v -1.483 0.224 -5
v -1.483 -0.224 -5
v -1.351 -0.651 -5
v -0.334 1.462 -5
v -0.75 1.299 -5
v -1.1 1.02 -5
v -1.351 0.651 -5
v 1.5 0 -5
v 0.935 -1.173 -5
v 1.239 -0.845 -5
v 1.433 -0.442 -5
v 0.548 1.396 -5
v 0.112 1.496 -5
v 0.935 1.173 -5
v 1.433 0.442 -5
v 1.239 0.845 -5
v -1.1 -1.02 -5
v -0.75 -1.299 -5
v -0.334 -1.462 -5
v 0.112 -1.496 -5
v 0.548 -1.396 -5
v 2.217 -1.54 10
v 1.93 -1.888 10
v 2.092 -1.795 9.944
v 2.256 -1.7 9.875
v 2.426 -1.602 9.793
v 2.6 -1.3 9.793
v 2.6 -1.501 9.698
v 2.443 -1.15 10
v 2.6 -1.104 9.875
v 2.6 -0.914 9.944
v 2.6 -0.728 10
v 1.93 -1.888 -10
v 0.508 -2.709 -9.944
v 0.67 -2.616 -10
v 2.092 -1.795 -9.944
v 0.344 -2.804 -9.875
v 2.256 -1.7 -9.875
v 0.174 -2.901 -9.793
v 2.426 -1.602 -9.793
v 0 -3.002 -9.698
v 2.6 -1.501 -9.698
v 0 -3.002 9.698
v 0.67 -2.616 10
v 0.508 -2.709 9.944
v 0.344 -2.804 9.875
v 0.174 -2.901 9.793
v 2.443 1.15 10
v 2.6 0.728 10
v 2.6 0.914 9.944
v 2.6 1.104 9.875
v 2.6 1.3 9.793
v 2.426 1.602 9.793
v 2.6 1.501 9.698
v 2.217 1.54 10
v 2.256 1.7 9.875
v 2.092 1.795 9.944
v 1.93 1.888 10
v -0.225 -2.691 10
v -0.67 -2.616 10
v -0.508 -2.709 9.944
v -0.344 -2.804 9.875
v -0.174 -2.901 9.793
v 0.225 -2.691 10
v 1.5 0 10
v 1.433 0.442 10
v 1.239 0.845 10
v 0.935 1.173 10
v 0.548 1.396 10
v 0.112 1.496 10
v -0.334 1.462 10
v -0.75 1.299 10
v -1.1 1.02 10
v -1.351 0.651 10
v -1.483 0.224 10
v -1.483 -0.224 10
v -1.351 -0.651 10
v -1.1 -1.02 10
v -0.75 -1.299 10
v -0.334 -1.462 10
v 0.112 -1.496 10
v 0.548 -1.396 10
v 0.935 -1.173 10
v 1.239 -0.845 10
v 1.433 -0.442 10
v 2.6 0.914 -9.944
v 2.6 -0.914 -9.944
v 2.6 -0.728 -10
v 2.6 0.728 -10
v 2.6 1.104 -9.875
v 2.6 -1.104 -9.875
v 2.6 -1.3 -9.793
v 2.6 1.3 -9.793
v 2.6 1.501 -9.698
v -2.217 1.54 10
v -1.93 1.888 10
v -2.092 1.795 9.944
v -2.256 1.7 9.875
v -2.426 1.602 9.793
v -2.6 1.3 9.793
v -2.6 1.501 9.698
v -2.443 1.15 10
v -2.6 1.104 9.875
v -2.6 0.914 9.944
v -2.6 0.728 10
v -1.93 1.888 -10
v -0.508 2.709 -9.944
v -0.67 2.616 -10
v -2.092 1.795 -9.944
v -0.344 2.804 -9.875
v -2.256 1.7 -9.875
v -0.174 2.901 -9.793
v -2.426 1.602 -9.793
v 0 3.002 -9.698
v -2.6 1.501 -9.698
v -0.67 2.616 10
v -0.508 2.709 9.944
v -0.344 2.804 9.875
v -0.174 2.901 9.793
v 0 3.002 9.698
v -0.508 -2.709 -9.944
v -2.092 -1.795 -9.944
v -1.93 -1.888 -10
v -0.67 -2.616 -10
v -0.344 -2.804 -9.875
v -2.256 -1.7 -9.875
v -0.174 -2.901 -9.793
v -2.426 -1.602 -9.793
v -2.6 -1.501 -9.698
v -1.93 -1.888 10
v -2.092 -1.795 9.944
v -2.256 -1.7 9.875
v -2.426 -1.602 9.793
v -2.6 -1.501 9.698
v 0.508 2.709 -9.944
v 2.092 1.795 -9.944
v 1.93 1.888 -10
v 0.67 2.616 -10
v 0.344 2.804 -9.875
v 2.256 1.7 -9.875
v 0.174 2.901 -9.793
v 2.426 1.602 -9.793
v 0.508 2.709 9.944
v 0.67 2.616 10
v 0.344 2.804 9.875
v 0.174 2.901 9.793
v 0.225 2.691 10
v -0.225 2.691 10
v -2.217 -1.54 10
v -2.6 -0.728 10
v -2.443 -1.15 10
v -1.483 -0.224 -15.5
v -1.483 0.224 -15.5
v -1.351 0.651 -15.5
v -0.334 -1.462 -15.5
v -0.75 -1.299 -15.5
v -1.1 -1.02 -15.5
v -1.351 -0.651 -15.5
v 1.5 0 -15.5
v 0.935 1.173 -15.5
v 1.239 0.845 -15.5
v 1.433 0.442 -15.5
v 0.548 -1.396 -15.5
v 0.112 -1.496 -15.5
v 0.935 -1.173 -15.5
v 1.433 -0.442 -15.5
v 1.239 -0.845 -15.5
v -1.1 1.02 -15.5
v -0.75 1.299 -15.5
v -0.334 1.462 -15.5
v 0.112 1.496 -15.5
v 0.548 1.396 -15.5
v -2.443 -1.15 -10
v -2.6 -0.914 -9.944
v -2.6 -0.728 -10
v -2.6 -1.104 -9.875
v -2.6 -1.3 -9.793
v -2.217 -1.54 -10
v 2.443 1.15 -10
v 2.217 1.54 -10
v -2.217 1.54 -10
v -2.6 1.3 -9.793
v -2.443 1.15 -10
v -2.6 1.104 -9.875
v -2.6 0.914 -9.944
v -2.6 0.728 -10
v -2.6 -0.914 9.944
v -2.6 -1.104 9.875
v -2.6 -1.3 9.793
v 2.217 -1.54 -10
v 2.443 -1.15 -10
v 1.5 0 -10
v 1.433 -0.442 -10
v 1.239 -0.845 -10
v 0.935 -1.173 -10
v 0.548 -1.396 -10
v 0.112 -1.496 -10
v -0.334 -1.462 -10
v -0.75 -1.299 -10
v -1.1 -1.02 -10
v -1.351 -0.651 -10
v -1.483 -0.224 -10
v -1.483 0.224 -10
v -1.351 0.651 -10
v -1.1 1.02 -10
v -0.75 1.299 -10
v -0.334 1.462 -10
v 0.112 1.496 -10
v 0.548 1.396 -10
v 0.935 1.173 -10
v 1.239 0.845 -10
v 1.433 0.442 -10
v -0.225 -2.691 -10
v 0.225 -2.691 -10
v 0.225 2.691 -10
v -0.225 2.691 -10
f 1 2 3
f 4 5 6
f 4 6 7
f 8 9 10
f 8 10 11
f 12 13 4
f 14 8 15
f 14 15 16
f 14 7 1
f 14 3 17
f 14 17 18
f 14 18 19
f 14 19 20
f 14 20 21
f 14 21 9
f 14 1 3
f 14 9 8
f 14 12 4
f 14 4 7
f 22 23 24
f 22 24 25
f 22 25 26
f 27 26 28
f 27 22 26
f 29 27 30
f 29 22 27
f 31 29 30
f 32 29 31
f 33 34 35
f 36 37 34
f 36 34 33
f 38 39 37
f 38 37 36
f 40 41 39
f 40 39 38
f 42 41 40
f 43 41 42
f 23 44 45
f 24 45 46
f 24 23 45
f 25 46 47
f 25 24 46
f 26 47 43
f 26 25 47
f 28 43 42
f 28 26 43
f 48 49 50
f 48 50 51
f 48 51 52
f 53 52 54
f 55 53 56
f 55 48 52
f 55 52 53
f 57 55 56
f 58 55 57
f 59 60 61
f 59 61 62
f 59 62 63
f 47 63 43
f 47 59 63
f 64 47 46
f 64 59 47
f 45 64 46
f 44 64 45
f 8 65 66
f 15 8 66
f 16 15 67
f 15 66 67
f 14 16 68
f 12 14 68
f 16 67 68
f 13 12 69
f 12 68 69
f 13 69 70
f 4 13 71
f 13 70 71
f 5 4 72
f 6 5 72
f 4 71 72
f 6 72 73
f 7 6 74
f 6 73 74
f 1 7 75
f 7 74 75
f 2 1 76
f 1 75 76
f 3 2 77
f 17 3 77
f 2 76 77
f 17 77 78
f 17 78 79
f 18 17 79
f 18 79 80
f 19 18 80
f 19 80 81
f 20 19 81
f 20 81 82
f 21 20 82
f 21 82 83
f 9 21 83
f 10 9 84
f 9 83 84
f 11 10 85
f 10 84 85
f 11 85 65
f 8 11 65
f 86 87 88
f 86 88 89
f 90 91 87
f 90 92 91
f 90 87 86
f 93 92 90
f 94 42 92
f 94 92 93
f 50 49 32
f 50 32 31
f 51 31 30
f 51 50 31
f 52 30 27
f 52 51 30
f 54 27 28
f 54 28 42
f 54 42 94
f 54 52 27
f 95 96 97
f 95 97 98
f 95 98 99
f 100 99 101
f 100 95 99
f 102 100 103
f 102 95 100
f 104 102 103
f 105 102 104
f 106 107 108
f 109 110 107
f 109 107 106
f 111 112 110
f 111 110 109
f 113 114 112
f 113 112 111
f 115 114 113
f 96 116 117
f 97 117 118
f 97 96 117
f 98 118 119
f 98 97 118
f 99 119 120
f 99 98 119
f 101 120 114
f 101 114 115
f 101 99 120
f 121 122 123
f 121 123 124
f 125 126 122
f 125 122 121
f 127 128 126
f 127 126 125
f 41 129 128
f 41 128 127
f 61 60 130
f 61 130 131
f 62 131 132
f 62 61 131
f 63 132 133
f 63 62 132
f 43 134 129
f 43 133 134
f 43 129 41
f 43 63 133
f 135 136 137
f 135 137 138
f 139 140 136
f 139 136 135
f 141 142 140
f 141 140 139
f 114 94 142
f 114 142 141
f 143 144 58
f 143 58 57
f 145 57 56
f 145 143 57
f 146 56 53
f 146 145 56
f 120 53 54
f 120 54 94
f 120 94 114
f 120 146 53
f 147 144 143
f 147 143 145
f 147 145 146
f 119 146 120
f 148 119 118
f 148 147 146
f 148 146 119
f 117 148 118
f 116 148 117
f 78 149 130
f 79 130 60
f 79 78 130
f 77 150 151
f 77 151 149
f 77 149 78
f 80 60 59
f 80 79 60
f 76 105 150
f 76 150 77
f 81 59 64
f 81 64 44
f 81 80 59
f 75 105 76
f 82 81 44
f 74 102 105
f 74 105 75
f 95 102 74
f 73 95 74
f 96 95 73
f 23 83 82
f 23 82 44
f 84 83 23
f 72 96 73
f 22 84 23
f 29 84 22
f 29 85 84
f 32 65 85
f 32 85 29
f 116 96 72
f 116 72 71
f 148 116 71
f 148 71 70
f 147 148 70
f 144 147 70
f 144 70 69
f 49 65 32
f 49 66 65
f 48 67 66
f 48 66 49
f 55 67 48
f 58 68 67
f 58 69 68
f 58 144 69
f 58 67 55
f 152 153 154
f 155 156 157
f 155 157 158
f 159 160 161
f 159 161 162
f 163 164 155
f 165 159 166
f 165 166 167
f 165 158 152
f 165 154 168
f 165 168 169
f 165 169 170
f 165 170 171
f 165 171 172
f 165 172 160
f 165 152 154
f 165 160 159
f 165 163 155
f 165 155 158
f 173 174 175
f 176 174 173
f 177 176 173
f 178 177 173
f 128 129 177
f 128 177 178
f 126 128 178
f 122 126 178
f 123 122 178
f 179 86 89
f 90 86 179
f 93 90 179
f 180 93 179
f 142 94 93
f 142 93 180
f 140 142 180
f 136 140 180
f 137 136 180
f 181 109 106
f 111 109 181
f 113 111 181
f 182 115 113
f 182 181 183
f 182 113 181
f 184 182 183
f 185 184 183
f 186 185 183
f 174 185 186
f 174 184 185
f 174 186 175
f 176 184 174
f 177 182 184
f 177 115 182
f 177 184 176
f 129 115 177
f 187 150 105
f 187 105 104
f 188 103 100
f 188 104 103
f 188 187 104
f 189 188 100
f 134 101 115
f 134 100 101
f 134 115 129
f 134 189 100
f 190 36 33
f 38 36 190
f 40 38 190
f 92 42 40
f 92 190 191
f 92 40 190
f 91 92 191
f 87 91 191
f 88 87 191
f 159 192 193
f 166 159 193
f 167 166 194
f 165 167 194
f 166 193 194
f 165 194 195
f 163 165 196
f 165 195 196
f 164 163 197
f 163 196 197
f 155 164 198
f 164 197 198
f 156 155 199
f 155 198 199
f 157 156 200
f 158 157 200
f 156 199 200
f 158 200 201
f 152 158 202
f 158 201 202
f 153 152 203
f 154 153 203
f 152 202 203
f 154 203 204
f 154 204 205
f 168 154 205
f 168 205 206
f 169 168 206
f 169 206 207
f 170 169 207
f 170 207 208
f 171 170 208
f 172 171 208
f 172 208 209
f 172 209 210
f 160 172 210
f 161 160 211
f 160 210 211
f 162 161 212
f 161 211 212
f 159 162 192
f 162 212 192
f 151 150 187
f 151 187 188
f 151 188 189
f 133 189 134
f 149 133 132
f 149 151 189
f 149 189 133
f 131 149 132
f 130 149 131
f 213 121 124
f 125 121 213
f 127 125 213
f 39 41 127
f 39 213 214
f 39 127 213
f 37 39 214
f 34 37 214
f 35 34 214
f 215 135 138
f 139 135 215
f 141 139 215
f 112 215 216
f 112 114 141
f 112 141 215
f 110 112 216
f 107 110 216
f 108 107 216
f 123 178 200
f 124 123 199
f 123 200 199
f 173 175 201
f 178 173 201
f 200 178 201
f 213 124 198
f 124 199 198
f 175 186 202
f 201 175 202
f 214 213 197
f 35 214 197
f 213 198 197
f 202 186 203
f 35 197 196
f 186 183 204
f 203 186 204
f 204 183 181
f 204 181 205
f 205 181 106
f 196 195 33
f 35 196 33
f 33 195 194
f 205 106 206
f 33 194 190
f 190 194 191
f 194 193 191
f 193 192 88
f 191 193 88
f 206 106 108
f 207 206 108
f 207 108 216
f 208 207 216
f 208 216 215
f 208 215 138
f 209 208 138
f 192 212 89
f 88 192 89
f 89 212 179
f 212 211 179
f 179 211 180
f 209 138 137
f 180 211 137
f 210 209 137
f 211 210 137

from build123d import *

# Parameters (mm, degrees)
PAD_DEPTH    = 10
SKETCH001_R  = 1.5
POCKET_DEPTH = 15
SKETCH002_R  = 1.5
PAD001_DEPTH = 5.5


with BuildPart() as body001:
    # Sketch003 → Revolution (revolve)
    with BuildSketch(Plane.YZ):
        Polygon((2.2, 10.5), (5.2, 10.5), (5.2, -10.5), (2.2, -10.5), (3.444538, -9.255462), (3.444538, 9.255462), align=None)
    revolve(axis=Axis((0, 0, 0), (0, 0, 1)))


with BuildPart() as cut:
    # Sketch → Pad (new body, symmetric)
    with BuildSketch(Plane.XY):
        Polygon((2.6, 1.501111), (0, 3.002221), (-2.6, 1.501111), (-2.6, -1.501111), (0, -3.002221), (2.6, -1.501111), align=None)
    extrude(amount=PAD_DEPTH, both=True)

    # Sketch001 (on Face8 of Pad) → Pocket (cut)
    with BuildSketch(Plane.XY.offset(10)):
        Circle(SKETCH001_R)
    extrude(amount=-POCKET_DEPTH, mode=Mode.SUBTRACT)

    # Sketch002 (on Face4 of Pocket) → Pad001 (join)
    with BuildSketch(Plane(origin=(0, 0, -10), x_dir=(1, 0, 0), z_dir=(0, 0, -1))):
        Circle(SKETCH002_R)
    extrude(amount=PAD001_DEPTH)

    # Cut: cut Body001
    add(body001.part, mode=Mode.SUBTRACT)


solid = cut.part
